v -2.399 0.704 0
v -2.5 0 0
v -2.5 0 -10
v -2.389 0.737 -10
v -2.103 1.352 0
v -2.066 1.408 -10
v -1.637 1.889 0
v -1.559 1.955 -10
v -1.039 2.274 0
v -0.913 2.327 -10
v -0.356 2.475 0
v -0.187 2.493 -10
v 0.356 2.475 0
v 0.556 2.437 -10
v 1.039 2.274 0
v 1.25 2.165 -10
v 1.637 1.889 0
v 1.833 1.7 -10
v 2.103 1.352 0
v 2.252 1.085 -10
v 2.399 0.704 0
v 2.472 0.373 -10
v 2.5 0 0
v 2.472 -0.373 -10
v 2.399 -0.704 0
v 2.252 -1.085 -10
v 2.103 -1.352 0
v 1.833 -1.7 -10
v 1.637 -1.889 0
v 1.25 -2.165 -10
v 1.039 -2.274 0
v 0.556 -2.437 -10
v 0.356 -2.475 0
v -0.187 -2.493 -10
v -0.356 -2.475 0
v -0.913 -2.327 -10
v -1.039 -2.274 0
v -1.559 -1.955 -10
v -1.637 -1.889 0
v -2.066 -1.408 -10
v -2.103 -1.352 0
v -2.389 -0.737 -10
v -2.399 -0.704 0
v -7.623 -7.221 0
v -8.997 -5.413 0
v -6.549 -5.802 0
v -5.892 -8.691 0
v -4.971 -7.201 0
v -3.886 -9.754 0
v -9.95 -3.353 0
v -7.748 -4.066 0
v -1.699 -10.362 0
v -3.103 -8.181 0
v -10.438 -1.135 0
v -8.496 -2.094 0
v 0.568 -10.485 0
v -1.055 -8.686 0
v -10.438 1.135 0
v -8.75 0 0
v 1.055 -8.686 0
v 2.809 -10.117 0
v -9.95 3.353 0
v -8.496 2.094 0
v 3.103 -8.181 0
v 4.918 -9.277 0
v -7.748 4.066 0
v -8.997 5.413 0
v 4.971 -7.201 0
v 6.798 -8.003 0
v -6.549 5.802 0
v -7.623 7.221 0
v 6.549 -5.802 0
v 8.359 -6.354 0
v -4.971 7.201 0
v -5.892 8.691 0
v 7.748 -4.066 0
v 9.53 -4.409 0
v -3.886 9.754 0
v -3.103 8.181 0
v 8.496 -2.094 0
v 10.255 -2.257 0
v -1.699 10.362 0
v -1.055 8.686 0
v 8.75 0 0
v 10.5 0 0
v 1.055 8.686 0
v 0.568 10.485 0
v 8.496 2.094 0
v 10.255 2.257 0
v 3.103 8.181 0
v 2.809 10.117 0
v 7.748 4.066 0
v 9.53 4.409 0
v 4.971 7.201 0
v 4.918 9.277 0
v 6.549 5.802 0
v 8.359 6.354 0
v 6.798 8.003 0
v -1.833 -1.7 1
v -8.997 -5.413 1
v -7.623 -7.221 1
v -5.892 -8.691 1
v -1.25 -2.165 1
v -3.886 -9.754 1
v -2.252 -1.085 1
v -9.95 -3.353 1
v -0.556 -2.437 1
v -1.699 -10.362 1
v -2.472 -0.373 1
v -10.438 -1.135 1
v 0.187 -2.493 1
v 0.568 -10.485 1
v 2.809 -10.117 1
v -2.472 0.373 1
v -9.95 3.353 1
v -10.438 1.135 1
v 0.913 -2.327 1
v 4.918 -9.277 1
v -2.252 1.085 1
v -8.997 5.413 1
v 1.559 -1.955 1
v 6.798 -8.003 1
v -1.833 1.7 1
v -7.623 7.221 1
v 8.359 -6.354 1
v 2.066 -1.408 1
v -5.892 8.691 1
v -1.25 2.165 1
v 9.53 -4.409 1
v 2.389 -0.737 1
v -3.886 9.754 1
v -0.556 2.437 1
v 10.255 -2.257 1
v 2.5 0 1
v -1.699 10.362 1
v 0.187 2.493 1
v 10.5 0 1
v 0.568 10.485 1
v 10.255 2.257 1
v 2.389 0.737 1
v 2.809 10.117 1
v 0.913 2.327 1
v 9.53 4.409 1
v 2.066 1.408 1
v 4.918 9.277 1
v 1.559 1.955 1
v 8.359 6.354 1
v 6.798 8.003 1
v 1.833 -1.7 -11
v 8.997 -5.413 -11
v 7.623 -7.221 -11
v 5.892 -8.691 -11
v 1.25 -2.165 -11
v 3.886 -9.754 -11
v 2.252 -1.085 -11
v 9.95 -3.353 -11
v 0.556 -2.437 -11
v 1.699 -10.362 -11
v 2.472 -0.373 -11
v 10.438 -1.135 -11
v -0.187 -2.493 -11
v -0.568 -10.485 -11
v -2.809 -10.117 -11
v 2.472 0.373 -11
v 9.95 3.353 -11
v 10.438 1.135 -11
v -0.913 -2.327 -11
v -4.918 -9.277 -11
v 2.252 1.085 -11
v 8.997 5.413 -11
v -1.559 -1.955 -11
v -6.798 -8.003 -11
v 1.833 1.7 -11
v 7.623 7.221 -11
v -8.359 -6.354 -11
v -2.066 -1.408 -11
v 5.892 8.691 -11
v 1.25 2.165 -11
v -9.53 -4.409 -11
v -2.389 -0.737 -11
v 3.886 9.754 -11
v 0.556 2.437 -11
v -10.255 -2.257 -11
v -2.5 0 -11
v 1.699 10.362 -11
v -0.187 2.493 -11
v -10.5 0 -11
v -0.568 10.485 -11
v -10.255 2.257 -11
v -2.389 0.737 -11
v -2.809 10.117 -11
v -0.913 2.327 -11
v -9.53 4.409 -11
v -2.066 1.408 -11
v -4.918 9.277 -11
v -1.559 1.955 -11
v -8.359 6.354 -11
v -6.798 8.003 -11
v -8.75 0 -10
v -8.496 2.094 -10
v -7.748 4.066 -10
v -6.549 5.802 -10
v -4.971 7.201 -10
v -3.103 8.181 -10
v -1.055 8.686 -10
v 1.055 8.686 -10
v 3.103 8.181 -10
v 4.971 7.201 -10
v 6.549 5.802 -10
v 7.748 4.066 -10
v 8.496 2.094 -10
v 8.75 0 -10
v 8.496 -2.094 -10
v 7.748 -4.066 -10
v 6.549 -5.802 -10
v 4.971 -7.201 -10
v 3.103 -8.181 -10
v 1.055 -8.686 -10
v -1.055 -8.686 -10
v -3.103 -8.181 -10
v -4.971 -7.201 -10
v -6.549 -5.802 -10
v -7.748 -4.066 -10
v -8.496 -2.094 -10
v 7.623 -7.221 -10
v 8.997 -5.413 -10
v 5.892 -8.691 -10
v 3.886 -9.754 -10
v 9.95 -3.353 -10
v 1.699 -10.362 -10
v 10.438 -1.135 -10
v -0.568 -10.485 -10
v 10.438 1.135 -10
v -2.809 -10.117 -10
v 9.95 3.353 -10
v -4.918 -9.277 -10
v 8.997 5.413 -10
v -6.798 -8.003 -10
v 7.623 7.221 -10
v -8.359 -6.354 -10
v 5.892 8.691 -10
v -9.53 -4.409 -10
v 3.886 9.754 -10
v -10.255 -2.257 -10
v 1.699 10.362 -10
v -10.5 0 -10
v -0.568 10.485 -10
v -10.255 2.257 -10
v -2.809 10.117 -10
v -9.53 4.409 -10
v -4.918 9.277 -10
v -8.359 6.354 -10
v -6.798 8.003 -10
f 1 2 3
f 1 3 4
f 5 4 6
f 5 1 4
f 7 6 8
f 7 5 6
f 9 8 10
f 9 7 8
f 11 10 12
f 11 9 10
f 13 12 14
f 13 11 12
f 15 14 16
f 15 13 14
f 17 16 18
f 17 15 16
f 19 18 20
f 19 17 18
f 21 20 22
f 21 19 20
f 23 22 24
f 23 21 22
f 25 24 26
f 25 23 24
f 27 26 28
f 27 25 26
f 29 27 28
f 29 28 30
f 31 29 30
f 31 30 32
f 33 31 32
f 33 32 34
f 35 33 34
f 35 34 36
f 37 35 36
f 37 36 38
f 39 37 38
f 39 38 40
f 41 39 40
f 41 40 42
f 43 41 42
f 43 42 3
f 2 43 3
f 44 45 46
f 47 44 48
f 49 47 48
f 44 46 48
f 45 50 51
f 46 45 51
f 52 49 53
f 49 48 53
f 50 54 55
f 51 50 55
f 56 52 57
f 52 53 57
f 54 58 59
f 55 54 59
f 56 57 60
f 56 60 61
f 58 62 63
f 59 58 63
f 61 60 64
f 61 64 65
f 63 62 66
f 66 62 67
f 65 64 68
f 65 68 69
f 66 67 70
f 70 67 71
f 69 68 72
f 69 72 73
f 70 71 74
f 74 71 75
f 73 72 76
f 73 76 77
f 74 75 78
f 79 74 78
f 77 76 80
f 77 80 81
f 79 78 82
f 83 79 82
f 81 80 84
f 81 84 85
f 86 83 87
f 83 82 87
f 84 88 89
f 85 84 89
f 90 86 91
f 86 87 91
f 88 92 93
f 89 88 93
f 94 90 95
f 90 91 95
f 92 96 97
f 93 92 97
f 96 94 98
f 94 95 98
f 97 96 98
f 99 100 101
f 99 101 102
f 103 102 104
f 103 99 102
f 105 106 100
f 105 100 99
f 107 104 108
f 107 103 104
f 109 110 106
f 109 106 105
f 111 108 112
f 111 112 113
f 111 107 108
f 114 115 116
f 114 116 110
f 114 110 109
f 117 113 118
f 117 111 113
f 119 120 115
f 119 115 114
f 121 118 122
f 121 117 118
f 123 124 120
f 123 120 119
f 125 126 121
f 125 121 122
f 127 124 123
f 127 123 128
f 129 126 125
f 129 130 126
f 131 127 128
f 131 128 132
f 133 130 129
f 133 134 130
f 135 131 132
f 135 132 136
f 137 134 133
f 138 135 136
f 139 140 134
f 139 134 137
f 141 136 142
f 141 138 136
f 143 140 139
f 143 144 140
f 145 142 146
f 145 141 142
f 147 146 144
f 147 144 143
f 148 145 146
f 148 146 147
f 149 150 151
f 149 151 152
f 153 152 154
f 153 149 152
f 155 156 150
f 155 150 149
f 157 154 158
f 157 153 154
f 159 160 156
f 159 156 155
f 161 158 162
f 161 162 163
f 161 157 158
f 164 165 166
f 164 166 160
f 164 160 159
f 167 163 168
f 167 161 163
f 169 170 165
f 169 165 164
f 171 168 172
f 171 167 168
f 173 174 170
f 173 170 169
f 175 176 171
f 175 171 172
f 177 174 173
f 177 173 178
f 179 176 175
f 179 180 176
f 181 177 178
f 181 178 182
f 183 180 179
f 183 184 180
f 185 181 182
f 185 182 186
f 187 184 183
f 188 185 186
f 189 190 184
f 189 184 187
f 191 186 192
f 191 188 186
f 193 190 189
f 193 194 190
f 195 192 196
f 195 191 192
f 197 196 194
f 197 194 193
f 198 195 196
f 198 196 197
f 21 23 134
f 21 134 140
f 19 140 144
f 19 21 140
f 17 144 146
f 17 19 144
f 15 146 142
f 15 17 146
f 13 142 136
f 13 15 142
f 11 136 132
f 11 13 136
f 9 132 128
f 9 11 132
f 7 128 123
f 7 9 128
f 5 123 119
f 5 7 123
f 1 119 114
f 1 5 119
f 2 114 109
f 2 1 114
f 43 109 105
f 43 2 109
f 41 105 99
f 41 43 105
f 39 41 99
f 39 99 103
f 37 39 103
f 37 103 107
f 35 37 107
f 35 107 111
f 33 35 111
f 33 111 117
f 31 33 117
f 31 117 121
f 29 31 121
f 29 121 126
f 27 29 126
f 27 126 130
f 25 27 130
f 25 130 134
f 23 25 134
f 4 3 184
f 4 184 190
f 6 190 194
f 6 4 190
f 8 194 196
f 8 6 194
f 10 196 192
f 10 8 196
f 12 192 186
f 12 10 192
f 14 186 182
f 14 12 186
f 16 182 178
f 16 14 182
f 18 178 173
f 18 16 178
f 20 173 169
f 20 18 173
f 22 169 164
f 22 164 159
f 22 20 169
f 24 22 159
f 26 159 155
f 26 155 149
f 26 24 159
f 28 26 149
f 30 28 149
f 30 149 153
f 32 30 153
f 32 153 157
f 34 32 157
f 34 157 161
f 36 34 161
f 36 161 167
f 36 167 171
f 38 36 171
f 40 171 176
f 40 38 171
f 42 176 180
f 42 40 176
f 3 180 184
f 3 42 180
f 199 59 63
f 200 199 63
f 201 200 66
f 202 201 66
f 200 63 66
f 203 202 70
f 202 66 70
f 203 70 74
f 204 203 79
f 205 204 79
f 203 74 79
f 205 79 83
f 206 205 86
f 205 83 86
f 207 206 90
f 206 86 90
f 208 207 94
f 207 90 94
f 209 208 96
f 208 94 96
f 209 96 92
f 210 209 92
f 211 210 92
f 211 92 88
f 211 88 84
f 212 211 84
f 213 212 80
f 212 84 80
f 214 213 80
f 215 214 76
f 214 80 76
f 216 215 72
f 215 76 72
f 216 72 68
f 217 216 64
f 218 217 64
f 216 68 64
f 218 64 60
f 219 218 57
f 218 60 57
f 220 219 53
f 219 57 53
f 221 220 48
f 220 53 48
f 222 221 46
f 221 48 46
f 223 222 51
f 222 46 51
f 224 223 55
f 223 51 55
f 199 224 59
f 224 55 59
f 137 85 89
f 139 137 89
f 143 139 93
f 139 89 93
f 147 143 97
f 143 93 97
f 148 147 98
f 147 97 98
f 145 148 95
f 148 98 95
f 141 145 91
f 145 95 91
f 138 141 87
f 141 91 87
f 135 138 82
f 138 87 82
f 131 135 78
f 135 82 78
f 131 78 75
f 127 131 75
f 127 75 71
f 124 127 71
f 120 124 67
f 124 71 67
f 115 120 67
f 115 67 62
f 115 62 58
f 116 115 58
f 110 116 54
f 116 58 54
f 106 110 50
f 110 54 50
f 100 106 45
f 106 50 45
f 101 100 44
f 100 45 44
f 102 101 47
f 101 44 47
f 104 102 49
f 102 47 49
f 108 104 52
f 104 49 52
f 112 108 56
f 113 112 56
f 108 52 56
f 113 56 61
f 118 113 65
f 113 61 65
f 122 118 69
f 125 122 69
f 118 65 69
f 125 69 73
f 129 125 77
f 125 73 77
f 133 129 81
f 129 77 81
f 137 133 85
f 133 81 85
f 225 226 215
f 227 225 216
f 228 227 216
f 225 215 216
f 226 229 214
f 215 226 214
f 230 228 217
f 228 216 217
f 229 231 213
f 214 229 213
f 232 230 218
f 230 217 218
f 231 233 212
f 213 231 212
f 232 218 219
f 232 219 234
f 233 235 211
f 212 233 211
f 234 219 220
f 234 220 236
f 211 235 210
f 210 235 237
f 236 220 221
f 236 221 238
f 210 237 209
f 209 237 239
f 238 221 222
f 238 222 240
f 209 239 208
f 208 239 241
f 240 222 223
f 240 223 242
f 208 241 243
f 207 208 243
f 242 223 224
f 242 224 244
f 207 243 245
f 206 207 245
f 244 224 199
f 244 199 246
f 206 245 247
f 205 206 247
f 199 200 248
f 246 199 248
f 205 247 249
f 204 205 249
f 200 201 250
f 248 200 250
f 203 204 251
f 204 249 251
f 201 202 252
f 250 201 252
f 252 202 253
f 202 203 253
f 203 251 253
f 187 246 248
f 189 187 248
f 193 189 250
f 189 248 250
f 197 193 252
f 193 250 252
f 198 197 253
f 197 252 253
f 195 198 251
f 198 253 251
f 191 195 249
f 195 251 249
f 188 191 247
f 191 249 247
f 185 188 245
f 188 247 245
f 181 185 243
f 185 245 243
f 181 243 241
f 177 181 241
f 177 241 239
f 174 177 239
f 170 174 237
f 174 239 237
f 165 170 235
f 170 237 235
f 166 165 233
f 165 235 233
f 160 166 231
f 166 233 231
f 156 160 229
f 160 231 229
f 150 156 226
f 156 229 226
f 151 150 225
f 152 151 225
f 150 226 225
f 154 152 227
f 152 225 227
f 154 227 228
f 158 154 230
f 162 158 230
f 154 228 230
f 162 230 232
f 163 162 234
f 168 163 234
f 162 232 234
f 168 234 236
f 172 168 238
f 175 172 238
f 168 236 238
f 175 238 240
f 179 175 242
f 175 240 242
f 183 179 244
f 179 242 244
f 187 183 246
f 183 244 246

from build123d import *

# Parameters (mm, degrees)
ESQUISSE1_R        = 10.5
ESQUISSE1_R_2      = 2.5
BOSS_EXTRU_1_DEPTH = 1
ESQUISSE2_R        = 8.75
ESQUISSE2_R_2      = 2.5
BOSS_EXTRU_2_DEPTH = 10
ESQUISSE3_R        = 10.5
ESQUISSE3_R_2      = 2.5
BOSS_EXTRU_3_DEPTH = 1


with BuildPart() as part:
    # Esquisse1 → Boss.-Extru.1 (new body)
    with BuildSketch(Plane.XY):
        Circle(ESQUISSE1_R)
        Circle(ESQUISSE1_R_2, mode=Mode.SUBTRACT)
    extrude(amount=BOSS_EXTRU_1_DEPTH)

    # Esquisse2 → Boss.-Extru.2 (add)
    with BuildSketch(Plane(origin=(0, 0, 0), x_dir=(-1, 0, 0), z_dir=(0, 0, -1))):
        Circle(ESQUISSE2_R)
        Circle(ESQUISSE2_R_2, mode=Mode.SUBTRACT)
    extrude(amount=BOSS_EXTRU_2_DEPTH)

    # Esquisse3 → Boss.-Extru.3 (add)
    with BuildSketch(Plane(origin=(0, 0, -10), x_dir=(-1, 0, 0), z_dir=(0, 0, -1))):
        Circle(ESQUISSE3_R)
        Circle(ESQUISSE3_R_2, mode=Mode.SUBTRACT)
    extrude(amount=BOSS_EXTRU_3_DEPTH)


solid = part.part
